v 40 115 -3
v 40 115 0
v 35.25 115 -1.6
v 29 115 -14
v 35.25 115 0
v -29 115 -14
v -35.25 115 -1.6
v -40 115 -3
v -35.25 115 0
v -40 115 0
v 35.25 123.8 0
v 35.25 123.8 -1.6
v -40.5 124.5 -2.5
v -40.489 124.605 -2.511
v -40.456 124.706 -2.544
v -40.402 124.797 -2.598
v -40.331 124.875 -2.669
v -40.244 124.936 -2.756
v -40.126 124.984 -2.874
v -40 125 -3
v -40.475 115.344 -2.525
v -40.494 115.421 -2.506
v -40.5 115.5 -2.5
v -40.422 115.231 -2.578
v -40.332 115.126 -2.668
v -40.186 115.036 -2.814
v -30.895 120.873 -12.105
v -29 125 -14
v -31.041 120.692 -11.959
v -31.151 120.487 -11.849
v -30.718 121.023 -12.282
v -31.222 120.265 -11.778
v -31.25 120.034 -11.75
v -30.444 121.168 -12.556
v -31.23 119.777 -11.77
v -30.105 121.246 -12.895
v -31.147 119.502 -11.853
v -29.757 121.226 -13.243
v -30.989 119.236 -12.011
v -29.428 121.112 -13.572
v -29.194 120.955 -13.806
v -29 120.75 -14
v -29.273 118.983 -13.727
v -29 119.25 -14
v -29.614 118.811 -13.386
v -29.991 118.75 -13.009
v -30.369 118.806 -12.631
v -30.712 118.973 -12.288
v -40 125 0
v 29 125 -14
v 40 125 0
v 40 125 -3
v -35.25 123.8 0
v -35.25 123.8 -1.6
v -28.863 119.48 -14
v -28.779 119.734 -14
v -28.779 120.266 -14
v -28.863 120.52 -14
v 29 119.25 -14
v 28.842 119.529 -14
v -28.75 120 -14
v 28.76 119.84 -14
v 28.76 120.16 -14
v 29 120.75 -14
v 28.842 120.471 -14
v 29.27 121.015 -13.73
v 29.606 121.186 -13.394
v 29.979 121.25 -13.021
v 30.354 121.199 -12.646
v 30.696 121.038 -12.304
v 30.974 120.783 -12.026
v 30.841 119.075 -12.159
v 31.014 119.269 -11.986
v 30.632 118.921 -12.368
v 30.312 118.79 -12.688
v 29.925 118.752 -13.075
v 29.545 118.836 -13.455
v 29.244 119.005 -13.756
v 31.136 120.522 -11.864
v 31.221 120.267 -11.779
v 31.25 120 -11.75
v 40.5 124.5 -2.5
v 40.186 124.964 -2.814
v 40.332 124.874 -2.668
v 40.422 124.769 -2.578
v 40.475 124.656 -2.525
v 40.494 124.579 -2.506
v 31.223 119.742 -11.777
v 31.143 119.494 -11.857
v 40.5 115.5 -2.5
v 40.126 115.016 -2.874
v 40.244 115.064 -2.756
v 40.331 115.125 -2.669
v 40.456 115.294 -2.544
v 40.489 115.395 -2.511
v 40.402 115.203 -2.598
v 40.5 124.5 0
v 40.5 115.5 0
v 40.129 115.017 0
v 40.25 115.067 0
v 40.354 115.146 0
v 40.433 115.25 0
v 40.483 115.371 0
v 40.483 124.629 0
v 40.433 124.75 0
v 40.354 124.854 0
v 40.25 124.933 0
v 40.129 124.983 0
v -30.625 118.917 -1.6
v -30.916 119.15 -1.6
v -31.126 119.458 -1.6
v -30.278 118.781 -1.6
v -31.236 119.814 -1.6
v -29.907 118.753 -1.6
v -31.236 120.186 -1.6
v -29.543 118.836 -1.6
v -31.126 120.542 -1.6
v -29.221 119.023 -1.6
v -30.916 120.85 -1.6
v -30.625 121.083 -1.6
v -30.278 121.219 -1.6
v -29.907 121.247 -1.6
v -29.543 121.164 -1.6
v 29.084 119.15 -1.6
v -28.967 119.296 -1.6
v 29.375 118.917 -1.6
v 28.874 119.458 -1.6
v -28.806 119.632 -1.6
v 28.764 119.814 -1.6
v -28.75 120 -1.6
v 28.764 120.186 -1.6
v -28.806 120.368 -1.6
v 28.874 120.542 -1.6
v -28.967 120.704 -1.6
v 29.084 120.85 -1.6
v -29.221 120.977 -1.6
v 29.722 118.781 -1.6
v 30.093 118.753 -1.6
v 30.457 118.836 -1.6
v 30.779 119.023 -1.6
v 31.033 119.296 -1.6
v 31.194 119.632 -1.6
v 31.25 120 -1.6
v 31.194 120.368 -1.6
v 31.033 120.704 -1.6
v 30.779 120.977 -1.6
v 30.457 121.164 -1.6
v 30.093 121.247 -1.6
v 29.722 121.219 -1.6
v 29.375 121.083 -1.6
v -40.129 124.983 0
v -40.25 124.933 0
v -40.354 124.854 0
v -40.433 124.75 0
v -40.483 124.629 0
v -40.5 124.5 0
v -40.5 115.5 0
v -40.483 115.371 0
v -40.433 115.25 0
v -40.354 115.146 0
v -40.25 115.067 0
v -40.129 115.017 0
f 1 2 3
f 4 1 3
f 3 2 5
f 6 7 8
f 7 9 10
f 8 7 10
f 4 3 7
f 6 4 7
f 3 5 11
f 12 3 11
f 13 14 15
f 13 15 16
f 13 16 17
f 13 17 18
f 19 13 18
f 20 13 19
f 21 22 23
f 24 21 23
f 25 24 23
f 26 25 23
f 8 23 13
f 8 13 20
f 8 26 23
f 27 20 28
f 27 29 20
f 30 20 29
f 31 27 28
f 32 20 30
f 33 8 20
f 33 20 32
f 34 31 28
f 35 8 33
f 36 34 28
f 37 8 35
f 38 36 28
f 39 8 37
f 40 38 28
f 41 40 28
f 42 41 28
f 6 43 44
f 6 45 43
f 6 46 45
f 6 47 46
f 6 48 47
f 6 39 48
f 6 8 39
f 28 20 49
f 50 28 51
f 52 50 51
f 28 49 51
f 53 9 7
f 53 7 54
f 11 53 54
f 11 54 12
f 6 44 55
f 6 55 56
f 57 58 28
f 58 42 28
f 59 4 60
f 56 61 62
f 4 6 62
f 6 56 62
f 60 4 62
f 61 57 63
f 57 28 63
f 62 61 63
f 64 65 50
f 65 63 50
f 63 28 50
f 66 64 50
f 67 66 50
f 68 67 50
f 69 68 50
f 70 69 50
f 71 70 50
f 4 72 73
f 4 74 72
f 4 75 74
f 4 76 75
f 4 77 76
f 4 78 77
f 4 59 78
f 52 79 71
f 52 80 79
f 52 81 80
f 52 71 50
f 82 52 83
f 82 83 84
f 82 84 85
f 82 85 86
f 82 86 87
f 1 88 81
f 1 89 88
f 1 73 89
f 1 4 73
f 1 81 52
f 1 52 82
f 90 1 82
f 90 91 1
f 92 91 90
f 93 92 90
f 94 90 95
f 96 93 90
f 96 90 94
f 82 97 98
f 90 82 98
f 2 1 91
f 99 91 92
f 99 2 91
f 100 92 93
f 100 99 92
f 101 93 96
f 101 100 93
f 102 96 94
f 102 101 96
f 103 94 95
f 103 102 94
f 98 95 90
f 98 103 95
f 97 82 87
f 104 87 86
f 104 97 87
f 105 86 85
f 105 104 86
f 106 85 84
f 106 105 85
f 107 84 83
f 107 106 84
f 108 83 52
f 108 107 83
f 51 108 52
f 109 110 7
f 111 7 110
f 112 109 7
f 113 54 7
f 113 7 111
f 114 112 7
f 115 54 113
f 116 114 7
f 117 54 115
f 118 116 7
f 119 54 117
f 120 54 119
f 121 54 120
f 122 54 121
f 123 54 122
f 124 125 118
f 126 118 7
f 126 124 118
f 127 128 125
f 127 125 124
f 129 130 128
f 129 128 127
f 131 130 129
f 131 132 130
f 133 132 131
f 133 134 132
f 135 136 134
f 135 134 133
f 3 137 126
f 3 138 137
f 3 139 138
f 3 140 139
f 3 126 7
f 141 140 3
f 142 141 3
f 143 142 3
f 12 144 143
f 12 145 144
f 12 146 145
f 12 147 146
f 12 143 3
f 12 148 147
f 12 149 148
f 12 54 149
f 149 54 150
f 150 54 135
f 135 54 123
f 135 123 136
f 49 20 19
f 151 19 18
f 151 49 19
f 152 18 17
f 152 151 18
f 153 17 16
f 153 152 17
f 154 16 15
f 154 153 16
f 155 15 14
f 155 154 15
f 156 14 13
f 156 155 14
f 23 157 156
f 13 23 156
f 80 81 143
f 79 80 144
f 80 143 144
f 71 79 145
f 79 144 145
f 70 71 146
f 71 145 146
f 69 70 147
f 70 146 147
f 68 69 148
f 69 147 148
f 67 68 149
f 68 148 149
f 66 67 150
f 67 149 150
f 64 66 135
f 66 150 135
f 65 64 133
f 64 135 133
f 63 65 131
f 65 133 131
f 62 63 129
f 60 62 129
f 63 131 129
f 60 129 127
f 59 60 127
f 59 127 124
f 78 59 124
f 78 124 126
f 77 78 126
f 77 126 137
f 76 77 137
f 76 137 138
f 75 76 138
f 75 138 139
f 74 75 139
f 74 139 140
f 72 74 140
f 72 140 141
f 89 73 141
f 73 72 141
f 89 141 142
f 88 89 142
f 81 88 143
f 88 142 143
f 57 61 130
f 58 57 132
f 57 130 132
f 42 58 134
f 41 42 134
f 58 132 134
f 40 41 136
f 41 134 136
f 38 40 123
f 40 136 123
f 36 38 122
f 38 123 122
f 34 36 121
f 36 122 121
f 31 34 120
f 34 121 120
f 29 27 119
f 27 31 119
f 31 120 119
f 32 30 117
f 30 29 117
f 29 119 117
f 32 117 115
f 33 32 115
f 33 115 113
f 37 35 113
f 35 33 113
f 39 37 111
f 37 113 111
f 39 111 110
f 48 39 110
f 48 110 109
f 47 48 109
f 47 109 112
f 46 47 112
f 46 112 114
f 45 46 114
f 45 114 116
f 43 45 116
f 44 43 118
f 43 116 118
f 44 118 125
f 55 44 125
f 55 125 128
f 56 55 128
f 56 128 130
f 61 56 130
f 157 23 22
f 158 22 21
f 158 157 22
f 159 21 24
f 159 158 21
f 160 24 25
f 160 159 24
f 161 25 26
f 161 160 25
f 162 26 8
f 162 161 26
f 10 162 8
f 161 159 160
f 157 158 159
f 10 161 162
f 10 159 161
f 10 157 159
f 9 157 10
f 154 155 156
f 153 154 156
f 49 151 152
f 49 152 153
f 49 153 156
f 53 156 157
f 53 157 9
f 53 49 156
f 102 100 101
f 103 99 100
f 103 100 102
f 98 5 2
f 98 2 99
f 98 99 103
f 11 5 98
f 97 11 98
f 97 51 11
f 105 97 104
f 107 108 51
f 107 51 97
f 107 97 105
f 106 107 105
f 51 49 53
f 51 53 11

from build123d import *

# Parameters (mm, degrees)
SKETCH053_R     = 1.25
PAD016_DEPTH    = 14
SKETCH054_W     = 70.5
SKETCH054_H     = 33.8
POCKET031_DEPTH = 1.6
POCKET032_DEPTH = 125.001


with BuildPart() as part:
    # Sketch053 → Pad016 (new body)
    with BuildSketch(Plane.XY):
        with BuildLine():
            ThreePointArc((-40, 125), (-40.353553, 124.853553), (-40.5, 124.5))
            Line((-40.5, 115.5), (-40.5, 124.5))
            ThreePointArc((-40.5, 115.5), (-40.353553, 115.146447), (-40, 115))
            Line((40, 115), (-40, 115))
            ThreePointArc((40, 115), (40.353553, 115.146447), (40.5, 115.5))
            Line((40.5, 124.5), (40.5, 115.5))
            ThreePointArc((40.5, 124.5), (40.353553, 124.853553), (40, 125))
            Line((-40, 125), (40, 125))
        make_face()
        with Locations((-30, 120)):
            Circle(SKETCH053_R, mode=Mode.SUBTRACT)
        with Locations((30, 120)):
            Circle(SKETCH053_R, mode=Mode.SUBTRACT)
    extrude(amount=-PAD016_DEPTH)

    # Sketch054 → Pocket031 (cut)
    with BuildSketch(Plane.XY):
        with Locations((0, 106.9)):
            Rectangle(SKETCH054_W, SKETCH054_H)
    extrude(amount=-POCKET031_DEPTH, mode=Mode.SUBTRACT)

    # Sketch055 → Pocket032 (cut, through all)
    with BuildSketch(Plane.XZ):
        Polygon((-53, 10), (0, -43), (53, 10), (53, -60), (-53, -60), align=None)
    extrude(amount=-POCKET032_DEPTH, mode=Mode.SUBTRACT)


solid = part.part
